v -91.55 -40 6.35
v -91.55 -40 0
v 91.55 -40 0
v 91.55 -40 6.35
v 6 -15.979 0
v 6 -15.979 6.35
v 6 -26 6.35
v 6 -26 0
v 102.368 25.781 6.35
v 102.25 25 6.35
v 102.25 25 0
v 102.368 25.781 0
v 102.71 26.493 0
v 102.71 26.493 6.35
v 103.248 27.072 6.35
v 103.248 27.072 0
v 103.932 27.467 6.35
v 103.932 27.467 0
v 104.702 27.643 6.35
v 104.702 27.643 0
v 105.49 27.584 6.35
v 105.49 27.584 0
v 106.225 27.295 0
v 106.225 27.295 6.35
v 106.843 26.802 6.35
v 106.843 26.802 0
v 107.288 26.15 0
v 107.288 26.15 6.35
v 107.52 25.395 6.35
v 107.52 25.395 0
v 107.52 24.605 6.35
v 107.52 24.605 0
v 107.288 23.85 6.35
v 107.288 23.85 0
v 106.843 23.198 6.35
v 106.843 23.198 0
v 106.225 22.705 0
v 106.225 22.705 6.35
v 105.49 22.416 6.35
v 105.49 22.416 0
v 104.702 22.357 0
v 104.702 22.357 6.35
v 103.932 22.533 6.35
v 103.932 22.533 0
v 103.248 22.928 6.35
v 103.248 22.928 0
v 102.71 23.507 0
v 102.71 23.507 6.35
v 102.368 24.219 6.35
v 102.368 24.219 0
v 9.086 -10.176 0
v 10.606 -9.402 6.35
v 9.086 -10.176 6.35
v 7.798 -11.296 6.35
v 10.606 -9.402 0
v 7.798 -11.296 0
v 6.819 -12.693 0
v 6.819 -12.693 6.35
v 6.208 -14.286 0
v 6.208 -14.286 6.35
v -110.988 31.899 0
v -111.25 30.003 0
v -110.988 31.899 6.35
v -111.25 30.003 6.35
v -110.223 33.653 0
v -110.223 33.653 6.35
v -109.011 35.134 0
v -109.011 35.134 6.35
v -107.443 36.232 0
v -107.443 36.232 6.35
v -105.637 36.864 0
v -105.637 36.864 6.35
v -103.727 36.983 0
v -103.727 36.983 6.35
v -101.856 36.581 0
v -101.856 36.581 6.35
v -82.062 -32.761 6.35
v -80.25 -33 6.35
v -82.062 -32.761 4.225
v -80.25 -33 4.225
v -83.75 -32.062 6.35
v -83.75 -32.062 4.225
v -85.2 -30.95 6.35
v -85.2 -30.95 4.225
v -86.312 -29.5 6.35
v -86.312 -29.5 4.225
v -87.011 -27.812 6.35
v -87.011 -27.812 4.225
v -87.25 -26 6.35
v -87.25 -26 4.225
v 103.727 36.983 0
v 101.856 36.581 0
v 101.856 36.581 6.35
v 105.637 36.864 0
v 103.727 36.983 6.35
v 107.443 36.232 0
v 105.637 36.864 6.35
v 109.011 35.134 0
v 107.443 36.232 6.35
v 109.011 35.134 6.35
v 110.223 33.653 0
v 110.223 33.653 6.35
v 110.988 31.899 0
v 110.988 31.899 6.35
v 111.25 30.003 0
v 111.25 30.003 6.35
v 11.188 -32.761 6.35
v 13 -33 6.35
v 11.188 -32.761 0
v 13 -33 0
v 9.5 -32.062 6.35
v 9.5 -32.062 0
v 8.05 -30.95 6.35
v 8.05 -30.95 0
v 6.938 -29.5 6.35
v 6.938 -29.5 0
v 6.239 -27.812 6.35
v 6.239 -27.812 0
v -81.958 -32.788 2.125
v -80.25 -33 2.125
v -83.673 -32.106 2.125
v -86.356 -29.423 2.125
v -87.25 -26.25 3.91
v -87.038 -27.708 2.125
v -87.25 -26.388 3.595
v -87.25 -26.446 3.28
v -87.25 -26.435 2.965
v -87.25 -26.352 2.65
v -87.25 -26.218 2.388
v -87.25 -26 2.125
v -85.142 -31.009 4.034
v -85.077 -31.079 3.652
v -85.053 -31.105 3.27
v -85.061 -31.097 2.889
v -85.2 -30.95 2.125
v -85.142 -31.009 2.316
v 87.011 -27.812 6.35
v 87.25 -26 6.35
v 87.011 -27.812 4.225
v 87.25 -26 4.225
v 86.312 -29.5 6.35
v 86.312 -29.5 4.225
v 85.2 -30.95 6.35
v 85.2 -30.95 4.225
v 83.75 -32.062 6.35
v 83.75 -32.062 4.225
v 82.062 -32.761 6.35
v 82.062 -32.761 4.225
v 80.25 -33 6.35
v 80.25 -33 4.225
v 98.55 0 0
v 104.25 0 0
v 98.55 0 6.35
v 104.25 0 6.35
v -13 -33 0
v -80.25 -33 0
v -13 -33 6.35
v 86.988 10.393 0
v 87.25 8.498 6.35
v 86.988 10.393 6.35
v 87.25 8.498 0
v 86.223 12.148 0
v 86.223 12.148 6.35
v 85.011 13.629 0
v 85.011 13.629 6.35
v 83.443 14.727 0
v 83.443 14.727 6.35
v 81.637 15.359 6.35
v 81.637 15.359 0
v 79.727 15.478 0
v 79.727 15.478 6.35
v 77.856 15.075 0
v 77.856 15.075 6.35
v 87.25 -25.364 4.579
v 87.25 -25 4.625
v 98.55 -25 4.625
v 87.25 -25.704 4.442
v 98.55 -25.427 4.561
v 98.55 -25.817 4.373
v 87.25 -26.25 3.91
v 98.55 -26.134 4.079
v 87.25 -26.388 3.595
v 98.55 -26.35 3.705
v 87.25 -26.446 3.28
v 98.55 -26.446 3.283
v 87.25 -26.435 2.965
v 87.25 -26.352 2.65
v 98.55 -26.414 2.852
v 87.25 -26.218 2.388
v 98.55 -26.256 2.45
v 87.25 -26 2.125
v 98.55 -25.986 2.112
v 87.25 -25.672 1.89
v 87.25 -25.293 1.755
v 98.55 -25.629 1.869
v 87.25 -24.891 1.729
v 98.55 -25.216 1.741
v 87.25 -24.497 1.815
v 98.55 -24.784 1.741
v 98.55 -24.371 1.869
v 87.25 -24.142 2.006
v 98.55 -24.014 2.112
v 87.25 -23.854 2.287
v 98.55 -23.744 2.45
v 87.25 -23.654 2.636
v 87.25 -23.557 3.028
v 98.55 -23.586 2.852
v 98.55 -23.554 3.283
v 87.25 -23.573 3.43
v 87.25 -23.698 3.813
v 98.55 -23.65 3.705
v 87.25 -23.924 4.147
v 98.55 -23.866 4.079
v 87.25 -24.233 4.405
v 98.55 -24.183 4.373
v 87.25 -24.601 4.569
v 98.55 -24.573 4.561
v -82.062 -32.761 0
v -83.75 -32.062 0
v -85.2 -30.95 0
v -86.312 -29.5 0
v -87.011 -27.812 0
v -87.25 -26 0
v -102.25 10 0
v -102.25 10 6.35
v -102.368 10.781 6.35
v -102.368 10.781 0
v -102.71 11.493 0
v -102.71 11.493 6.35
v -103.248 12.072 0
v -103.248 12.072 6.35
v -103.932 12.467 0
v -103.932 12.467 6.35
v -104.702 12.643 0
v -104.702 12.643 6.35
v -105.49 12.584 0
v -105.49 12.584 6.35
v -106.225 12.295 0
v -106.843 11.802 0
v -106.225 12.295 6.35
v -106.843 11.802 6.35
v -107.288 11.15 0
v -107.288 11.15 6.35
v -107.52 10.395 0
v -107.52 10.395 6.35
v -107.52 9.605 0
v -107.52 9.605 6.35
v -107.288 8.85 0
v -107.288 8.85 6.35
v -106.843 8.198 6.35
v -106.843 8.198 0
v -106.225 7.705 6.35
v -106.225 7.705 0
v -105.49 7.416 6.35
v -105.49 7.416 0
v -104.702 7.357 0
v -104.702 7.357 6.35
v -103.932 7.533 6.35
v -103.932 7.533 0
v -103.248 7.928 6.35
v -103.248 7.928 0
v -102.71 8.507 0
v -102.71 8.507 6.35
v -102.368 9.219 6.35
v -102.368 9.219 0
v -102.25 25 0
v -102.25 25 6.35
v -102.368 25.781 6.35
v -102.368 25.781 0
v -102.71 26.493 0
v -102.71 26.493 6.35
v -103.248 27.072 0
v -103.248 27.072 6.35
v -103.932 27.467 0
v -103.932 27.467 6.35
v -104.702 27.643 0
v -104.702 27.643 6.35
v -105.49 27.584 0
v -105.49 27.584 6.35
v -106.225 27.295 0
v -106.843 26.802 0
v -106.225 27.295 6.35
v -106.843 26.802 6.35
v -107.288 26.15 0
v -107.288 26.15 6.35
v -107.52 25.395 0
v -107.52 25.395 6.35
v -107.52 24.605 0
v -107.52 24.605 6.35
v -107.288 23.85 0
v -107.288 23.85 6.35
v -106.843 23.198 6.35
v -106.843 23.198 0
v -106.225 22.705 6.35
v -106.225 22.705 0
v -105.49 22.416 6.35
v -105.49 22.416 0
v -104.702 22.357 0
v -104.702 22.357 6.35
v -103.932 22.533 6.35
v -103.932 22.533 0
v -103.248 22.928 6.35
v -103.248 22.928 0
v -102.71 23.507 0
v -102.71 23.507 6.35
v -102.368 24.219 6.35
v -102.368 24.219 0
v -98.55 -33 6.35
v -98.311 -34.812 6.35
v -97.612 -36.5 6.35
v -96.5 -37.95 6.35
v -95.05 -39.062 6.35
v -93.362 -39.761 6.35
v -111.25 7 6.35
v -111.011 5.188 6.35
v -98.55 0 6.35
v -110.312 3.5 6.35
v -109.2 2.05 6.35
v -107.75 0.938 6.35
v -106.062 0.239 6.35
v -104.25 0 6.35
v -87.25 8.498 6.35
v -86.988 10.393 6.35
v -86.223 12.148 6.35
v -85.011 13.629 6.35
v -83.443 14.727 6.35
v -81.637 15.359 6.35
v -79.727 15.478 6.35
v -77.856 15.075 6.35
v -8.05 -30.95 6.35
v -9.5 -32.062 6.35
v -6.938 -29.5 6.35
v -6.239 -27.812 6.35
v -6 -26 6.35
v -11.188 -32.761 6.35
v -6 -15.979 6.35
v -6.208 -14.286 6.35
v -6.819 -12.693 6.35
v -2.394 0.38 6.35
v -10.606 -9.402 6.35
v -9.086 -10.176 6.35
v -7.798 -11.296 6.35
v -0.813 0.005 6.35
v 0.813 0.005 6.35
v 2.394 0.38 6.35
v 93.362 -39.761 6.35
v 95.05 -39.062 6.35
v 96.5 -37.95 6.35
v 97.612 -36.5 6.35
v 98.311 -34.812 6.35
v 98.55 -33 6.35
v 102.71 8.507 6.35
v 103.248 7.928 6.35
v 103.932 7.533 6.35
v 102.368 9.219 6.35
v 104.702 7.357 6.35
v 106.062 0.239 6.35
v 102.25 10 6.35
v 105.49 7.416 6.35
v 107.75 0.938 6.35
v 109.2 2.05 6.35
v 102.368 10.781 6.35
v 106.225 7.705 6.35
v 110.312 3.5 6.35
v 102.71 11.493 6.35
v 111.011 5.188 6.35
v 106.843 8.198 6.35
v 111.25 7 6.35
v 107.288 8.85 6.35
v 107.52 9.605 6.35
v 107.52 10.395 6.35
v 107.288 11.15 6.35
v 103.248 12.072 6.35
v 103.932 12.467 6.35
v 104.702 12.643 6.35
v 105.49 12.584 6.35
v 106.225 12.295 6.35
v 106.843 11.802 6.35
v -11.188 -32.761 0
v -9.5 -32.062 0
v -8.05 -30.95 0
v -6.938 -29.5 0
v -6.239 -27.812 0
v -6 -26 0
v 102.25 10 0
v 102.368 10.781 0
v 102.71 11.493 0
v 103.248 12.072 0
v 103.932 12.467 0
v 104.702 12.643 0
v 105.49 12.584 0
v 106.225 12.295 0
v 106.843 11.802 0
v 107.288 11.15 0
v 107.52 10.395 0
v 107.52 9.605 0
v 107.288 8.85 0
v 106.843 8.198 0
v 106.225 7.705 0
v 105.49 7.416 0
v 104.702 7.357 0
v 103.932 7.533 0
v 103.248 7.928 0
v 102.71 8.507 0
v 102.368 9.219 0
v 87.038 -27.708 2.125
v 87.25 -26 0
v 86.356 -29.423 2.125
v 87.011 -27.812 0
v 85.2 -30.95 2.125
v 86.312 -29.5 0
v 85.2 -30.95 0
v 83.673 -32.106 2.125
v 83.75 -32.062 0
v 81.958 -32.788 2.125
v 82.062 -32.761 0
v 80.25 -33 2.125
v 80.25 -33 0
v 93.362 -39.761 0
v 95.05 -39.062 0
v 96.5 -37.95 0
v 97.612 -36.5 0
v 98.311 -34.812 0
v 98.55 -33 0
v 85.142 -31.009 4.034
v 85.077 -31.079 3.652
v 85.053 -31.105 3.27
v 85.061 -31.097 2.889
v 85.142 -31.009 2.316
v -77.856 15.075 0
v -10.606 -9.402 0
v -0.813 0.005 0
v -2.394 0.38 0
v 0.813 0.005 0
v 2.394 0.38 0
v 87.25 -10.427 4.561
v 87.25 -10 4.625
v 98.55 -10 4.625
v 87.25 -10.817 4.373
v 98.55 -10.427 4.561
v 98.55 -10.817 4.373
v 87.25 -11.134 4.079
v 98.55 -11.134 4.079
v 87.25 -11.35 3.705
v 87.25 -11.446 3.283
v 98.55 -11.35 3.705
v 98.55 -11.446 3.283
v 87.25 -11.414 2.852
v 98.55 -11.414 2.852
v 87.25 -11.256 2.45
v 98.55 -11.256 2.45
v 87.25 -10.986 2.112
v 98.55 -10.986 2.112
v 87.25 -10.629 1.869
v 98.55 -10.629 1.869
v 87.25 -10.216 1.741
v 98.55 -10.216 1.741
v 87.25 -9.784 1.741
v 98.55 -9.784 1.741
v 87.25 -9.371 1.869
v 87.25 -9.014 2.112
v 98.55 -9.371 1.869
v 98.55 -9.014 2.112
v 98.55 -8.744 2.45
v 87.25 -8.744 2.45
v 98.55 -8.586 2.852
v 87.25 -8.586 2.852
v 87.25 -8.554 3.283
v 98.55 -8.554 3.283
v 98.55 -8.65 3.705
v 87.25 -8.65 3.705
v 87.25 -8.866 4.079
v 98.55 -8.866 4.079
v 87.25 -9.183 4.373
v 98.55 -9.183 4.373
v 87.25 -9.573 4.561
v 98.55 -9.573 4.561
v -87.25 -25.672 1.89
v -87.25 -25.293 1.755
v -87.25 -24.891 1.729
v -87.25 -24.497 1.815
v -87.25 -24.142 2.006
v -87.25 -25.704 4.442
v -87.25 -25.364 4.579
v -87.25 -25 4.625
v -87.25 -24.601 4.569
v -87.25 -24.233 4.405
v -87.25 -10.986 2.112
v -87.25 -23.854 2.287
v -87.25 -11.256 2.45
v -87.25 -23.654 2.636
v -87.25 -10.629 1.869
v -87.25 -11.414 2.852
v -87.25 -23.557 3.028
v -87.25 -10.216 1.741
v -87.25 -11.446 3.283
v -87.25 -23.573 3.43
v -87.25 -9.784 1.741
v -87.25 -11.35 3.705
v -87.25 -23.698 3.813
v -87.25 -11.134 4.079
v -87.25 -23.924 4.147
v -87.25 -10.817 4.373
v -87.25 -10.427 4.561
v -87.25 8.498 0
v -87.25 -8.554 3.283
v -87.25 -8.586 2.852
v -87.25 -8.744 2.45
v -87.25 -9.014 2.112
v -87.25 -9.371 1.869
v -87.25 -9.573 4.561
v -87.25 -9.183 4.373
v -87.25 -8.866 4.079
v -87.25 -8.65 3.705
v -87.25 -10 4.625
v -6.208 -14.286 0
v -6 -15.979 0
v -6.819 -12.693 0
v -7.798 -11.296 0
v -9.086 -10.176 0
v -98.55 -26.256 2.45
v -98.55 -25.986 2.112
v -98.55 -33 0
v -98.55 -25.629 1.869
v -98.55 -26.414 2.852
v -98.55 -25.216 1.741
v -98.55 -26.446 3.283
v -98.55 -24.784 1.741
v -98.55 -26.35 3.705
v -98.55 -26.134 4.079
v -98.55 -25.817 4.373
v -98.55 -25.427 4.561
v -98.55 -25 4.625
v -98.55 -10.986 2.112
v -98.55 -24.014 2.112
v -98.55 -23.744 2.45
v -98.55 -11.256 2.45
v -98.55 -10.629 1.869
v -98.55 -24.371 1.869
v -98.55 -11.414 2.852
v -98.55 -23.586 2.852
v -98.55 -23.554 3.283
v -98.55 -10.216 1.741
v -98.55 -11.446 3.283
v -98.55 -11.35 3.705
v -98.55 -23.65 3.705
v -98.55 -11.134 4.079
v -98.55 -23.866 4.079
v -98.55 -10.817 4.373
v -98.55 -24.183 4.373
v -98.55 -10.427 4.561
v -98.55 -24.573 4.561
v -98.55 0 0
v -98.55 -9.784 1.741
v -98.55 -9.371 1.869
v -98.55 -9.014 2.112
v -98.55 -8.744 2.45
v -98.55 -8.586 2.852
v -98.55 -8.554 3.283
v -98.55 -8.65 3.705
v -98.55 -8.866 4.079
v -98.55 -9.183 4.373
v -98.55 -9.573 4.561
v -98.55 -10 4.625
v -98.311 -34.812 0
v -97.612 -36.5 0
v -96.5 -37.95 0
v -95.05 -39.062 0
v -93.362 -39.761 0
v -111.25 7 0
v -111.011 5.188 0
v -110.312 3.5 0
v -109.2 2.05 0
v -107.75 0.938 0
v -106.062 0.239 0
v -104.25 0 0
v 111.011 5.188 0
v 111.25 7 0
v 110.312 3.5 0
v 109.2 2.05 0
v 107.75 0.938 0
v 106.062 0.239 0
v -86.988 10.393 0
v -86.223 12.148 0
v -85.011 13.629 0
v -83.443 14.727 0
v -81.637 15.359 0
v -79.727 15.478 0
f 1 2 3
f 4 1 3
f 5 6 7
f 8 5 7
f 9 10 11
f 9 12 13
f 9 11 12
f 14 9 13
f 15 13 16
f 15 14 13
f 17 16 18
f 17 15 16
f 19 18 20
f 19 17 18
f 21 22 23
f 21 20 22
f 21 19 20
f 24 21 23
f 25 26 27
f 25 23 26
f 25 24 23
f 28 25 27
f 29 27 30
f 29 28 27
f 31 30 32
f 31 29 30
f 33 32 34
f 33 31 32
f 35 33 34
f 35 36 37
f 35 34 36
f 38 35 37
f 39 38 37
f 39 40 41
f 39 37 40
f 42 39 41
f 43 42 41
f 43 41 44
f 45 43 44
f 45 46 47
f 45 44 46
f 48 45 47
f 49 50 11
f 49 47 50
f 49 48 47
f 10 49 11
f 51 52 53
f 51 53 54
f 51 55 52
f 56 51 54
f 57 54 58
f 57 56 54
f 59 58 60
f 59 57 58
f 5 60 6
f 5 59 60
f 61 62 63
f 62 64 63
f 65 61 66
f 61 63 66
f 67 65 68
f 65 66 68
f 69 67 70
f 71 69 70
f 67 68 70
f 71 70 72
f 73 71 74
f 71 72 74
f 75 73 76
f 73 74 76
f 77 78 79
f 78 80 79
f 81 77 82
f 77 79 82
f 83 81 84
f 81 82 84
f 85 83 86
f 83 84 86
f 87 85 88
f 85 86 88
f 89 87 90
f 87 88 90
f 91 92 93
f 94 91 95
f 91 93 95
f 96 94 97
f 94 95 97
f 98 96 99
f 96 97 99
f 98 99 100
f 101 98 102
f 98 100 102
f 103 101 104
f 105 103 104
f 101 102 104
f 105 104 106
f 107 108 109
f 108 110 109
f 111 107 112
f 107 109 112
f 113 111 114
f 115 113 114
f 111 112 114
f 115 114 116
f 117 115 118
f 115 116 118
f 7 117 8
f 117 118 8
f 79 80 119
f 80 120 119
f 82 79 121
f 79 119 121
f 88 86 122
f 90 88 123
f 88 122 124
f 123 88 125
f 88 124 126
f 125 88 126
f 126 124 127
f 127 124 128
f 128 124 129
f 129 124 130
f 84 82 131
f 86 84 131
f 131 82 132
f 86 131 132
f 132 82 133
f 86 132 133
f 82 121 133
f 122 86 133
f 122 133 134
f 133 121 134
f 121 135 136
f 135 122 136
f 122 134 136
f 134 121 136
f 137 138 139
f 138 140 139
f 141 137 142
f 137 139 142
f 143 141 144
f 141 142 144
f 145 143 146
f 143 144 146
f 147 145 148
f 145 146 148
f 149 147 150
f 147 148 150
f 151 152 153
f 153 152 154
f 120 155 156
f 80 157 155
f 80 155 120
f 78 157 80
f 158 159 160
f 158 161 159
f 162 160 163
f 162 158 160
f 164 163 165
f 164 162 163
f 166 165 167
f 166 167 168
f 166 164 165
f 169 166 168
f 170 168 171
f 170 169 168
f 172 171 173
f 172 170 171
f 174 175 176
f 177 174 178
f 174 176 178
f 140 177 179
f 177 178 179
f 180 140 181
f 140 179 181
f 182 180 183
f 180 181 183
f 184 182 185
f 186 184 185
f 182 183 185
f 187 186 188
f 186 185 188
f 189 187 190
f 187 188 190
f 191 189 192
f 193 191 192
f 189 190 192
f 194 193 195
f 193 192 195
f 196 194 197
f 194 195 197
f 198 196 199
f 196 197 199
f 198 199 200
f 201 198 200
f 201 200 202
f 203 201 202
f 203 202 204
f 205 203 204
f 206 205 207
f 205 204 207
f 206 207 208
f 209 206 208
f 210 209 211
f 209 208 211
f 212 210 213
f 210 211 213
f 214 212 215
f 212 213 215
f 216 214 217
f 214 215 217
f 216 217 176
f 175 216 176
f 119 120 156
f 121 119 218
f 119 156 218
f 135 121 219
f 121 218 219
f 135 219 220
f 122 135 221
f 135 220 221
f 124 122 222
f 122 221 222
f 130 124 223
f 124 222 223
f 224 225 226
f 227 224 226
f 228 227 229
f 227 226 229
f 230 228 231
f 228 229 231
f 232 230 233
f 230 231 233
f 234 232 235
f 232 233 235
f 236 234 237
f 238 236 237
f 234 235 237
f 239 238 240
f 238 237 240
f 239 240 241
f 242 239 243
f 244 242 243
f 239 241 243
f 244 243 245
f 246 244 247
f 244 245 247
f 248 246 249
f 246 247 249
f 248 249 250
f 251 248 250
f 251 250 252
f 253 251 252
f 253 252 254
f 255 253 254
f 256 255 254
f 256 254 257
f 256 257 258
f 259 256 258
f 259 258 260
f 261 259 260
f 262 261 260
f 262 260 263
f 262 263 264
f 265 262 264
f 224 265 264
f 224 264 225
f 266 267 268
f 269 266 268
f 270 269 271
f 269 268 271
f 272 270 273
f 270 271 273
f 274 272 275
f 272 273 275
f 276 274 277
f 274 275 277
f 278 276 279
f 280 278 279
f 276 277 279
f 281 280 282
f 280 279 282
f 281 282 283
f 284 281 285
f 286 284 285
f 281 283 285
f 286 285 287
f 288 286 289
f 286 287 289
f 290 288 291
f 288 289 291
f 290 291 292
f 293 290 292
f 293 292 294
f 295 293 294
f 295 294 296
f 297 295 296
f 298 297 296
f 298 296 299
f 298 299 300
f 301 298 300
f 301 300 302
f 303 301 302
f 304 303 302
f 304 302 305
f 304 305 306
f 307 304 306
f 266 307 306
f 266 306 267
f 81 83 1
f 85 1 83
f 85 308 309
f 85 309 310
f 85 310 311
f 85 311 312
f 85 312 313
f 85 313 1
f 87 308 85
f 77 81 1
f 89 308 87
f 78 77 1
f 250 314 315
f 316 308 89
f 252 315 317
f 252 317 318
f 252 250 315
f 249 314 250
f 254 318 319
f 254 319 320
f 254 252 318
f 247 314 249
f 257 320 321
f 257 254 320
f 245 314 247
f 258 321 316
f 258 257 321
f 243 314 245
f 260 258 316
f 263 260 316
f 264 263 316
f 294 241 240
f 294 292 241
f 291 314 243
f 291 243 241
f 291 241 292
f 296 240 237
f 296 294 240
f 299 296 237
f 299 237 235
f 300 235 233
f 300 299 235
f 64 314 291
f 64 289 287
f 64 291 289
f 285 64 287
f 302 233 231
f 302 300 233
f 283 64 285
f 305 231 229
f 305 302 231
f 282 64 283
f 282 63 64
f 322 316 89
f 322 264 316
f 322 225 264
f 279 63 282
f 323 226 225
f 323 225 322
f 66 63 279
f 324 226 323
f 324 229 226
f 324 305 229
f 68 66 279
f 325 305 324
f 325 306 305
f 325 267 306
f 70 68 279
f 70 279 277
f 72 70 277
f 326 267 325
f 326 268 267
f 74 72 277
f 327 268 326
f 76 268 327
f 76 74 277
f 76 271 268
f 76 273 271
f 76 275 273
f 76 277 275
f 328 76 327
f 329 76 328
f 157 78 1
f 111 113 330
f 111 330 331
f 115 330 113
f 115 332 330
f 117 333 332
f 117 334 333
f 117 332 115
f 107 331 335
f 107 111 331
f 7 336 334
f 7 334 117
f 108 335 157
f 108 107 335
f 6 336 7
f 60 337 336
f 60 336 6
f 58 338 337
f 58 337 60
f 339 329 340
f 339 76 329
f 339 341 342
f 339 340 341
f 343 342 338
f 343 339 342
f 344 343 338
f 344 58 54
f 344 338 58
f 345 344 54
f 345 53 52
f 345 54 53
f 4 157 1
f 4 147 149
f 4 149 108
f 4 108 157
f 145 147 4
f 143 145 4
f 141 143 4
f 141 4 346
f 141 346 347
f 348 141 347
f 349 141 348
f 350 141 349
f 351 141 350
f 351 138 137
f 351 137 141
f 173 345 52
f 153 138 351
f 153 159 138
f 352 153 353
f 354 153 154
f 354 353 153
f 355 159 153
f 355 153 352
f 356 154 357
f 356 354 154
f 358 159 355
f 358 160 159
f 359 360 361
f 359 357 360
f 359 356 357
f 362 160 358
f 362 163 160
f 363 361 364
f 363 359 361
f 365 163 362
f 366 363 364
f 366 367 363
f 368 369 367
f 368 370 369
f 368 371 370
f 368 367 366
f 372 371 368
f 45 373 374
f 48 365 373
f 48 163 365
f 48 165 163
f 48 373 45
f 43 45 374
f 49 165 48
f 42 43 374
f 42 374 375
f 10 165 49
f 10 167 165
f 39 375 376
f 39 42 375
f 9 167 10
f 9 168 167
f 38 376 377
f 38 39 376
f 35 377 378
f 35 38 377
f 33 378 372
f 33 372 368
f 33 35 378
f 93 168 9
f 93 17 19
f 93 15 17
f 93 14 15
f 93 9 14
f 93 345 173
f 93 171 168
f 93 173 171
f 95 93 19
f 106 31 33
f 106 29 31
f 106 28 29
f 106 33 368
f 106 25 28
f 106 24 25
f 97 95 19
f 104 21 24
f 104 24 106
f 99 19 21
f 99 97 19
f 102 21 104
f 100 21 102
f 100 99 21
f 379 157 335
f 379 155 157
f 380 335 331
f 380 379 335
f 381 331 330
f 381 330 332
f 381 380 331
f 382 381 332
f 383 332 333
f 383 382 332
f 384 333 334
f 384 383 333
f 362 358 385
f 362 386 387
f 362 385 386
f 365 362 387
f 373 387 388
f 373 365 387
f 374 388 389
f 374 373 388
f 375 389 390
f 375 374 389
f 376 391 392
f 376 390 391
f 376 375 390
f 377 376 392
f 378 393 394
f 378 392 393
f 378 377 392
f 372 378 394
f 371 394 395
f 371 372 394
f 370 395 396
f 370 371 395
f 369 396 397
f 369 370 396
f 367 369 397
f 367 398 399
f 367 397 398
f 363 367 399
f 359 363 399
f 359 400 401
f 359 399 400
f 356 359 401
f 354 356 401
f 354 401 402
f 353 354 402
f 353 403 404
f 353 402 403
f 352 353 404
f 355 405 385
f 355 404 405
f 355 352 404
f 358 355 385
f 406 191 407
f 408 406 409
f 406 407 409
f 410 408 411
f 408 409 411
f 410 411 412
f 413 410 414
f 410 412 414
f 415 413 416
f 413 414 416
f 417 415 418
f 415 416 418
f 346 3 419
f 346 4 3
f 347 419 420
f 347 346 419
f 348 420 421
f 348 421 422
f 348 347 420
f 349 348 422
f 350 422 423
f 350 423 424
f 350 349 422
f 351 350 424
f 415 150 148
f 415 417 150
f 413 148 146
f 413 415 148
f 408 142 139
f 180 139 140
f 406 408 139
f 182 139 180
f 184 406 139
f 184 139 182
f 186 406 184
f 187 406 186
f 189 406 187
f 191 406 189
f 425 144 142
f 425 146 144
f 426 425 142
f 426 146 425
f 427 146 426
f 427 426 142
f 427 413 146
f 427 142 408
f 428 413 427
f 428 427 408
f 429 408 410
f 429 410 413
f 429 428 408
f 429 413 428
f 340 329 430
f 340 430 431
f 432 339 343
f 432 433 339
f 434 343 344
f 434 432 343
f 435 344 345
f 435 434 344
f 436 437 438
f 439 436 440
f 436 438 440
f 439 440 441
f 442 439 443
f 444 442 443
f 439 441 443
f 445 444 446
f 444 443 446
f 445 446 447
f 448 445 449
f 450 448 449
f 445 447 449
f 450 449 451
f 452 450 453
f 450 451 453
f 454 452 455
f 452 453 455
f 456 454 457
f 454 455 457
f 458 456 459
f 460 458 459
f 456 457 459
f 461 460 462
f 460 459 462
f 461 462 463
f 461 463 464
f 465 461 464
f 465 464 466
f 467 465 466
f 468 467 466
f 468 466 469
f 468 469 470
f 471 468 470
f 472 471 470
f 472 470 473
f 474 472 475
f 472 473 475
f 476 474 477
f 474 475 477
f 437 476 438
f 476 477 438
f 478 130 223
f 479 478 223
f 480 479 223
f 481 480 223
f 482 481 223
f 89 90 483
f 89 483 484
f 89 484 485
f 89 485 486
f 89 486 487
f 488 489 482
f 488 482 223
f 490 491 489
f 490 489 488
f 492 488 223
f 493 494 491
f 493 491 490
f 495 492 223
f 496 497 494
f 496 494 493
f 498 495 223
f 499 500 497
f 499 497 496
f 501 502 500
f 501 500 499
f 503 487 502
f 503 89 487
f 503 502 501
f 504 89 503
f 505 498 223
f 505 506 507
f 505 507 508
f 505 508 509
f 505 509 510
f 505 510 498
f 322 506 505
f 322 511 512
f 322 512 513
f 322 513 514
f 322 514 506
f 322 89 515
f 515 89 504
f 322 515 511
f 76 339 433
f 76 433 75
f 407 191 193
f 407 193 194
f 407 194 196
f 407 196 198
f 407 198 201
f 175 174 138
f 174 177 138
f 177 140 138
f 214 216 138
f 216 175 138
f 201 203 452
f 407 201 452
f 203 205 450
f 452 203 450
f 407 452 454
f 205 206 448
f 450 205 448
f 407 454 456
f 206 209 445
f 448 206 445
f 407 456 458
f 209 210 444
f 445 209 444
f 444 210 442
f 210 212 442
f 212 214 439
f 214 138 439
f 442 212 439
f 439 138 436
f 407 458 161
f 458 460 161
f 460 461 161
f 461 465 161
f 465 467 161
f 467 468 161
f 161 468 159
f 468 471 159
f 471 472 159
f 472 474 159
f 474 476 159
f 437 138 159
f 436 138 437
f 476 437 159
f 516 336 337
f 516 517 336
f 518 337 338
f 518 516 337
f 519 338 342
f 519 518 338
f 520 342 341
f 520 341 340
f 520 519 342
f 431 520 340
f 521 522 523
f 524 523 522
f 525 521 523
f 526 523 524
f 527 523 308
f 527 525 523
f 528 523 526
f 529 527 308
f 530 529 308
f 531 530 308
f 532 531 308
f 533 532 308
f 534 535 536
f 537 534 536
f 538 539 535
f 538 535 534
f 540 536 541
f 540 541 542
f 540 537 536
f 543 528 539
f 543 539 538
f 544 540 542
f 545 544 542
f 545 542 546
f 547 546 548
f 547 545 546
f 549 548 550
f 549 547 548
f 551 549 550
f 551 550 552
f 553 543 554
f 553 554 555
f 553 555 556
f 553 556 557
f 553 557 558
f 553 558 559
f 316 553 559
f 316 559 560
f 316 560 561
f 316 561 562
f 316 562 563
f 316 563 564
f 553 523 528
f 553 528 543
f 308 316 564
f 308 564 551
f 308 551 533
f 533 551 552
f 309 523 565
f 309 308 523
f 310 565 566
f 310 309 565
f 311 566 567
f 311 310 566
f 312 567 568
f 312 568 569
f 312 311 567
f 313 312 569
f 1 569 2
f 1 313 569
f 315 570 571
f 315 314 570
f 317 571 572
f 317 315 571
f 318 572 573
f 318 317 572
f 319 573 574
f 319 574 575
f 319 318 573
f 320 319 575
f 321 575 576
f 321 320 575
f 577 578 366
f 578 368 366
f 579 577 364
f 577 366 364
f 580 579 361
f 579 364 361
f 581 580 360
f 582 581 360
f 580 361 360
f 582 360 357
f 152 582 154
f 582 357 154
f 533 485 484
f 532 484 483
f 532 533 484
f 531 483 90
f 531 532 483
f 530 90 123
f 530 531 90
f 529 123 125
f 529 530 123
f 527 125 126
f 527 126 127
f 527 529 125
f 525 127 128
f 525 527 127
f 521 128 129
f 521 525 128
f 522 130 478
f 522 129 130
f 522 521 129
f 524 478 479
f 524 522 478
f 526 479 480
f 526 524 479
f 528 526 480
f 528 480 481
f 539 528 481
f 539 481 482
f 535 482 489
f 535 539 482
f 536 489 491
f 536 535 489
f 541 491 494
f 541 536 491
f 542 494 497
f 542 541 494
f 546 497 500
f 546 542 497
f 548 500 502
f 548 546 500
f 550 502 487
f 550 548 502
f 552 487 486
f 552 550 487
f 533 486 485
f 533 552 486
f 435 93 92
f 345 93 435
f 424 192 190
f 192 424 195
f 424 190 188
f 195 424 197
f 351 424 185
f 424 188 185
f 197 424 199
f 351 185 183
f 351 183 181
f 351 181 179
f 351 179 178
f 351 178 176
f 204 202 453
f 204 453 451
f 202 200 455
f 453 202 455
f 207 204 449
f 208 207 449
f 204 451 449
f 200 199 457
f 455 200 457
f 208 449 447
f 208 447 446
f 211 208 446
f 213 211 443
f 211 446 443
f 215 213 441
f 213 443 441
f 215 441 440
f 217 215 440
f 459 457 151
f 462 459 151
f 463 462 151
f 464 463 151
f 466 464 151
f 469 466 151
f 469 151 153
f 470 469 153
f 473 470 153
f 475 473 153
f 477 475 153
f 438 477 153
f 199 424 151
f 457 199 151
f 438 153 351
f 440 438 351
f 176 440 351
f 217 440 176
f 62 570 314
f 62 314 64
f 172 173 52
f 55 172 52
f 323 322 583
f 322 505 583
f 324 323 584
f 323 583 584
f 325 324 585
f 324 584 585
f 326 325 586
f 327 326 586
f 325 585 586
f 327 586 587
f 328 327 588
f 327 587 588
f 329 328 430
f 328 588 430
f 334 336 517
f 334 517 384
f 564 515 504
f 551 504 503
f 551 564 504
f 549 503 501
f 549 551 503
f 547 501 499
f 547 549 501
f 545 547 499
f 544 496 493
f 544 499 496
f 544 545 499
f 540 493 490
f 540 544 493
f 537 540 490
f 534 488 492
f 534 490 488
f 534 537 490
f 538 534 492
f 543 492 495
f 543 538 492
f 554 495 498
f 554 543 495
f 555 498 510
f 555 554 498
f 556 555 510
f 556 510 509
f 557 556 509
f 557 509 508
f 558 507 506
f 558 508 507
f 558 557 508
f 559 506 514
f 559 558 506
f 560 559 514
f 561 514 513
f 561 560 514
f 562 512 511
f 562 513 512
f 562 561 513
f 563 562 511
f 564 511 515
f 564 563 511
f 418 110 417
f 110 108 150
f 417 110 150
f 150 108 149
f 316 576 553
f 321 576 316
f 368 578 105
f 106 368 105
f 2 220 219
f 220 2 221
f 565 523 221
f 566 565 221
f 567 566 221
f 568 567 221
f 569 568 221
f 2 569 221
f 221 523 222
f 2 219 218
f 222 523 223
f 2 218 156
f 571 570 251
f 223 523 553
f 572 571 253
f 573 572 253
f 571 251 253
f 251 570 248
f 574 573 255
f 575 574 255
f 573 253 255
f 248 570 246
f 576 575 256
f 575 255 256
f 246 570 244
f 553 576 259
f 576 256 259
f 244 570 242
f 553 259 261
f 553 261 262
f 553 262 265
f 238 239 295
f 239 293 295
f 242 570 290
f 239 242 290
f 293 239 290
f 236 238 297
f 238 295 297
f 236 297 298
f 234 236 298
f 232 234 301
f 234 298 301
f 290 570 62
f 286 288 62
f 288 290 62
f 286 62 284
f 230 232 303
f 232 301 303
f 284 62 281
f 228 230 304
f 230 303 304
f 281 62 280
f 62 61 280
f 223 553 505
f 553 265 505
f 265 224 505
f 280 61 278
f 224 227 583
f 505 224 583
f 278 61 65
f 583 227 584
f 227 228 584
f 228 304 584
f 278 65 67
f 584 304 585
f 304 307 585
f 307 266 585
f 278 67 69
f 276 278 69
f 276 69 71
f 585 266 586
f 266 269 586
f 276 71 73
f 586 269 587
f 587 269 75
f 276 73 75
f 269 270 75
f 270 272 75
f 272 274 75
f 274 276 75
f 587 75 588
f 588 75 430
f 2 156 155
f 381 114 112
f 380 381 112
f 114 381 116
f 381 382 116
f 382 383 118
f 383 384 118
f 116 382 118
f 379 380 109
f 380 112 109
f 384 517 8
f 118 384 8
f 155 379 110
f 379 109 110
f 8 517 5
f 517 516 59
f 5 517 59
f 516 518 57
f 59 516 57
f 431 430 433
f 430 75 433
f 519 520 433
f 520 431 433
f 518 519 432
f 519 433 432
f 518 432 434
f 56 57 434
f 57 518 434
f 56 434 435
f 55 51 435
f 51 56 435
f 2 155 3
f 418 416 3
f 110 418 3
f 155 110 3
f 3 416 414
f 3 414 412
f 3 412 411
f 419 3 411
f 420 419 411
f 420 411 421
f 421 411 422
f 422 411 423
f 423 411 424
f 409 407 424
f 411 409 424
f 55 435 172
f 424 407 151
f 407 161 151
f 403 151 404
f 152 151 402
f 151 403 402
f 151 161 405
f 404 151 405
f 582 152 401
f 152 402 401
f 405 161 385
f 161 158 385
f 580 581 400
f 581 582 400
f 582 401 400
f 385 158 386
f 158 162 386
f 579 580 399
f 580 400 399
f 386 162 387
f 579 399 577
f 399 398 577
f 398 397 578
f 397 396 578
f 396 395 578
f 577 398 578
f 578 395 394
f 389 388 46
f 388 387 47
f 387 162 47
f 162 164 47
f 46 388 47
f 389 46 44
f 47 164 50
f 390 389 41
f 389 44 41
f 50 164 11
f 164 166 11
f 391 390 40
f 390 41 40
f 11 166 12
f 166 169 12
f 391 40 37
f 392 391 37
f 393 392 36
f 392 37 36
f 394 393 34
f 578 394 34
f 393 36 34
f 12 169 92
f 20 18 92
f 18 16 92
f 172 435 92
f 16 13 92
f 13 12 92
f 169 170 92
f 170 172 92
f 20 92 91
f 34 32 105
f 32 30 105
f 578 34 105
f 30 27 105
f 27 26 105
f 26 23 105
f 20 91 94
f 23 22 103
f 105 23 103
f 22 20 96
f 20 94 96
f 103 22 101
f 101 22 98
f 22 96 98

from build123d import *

# Parameters (mm, degrees)
SKETCH1_W                        = 222.5
SKETCH1_H                        = 80
BOSS_EXTRUDE1_DEPTH              = 6.35
SKETCH6_W                        = 6.35
SKETCH6_H                        = 40
CUT_EXTRUDE3_DEPTH               = 12.7
M3_5X0_6_TAPPED_HOLE1_AT_2_COUNT = 2
M3_5X0_6_TAPPED_HOLE1_AT_2_PITCH = 15
CUT_EXTRUDE1_DEPTH               = 119.392926309
CUT_EXTRUDE2_DEPTH               = 119.392926309
M5_CLEARANCE_HOLE1_D             = 5.3
FILLET1_R                        = 7


with BuildPart() as part:
    # Sketch1 → Boss-Extrude1 (new body)
    with BuildSketch(Plane.XY):
        Rectangle(SKETCH1_W, SKETCH1_H)
    extrude(amount=BOSS_EXTRUDE1_DEPTH)

    # Sketch6 → Cut-Extrude3 (cut)
    with BuildSketch(Plane.ZY.offset(111.25)):
        with Locations((3.175, -20)):
            Rectangle(SKETCH6_W, SKETCH6_H)
    cut_extrude3 = extrude(amount=-CUT_EXTRUDE3_DEPTH, mode=Mode.SUBTRACT)

    # Sketch7 → M3.5x0.6 Tapped Hole1 (revolve, cut)
    with BuildSketch(Plane(origin=(-98.55, -25, 3.175), x_dir=(0, 0, 1), z_dir=(0, 1, 0))):
        Polygon((0, 0), (0, 14.671247898), (1.45, 13.8), (1.45, 0), align=None)
    m3_5x0_6_tapped_hole1 = revolve(axis=Axis((-104.9, -25, 3.175), (1, 0, 0)), mode=Mode.SUBTRACT)

    # M3.5x0.6 Tapped Hole1 at 2: M3.5x0.6 Tapped Hole1 ×2
    with Locations(*[(0, i * M3_5X0_6_TAPPED_HOLE1_AT_2_PITCH, 0) for i in range(1, M3_5X0_6_TAPPED_HOLE1_AT_2_COUNT)]):
        add(m3_5x0_6_tapped_hole1, mode=Mode.SUBTRACT)

    # Sketch2 → Cut-Extrude1 (cut, through all)
    with BuildSketch(Plane.XY.offset(6.35)):
        Polygon((111.25, 40), (0, -0.491688562), (-111.25, 40), align=None)
    extrude(amount=-CUT_EXTRUDE1_DEPTH, mode=Mode.SUBTRACT)

    # Sketch3 → Cut-Extrude2 (cut, through all)
    with BuildSketch(Plane.XY.offset(6.35)):
        Polygon((-87.25, -33), (-87.25, 18.494581108), (-6, -11.078000426), (-6, -33), align=None)
    cut_extrude2 = extrude(amount=-CUT_EXTRUDE2_DEPTH, mode=Mode.SUBTRACT)

    # M5 Clearance Hole1 (through all)
    with Locations(Plane(origin=(0, 0, 0), x_dir=(-1, 0, 0), z_dir=(0, 0, -1))):
        with Locations((104.9, 10), (104.9, 25)):
            m5_clearance_hole1 = Hole(M5_CLEARANCE_HOLE1_D / 2)

    # Mirror1: Cut-Extrude3, M3.5x0.6 Tapped Hole1, Cut-Extrude2, M5 Clearance Hole1 across plane
    add(cut_extrude3.mirror(Plane(origin=(0, 0, 0), x_dir=(0, 0, 1), z_dir=(1, 0, 0))), mode=Mode.SUBTRACT)
    add(m3_5x0_6_tapped_hole1.mirror(Plane(origin=(0, 0, 0), x_dir=(0, 0, 1), z_dir=(1, 0, 0))), mode=Mode.SUBTRACT)
    add(cut_extrude2.mirror(Plane(origin=(0, 0, 0), x_dir=(0, 0, 1), z_dir=(1, 0, 0))), mode=Mode.SUBTRACT)
    add(m5_clearance_hole1.mirror(Plane(origin=(0, 0, 0), x_dir=(0, 0, 1), z_dir=(1, 0, 0))), mode=Mode.SUBTRACT)

    # Mirror1 copy 1 sketch → Mirror1 copy 1 (revolve, cut)
    with BuildSketch(Plane(origin=(98.55, -10, 3.175), x_dir=(0, 0, 1), z_dir=(0, 1, 0))):
        Polygon((0, 0), (0, -14.671247898), (1.45, -13.8), (1.45, 0), align=None)
    revolve(axis=Axis((104.9, -10, 3.175), (1, 0, 0)), mode=Mode.SUBTRACT)

    # Fillet1
    fillet1_edges = [part.edges().sort_by_distance(p)[0] for p in [
        (87.25, 18.494581108, 3.175),
        (87.25, -33, 3.175),
        (6, -33, 3.175),
        (6, -11.078000426, 3.175),
        (-98.55, -40, 3.175),
        (-111.25, 0, 3.175),
        (0, -0.491688562, 3.175),
        (-87.25, -33, 3.175),
        (-6, -33, 3.175),
        (-87.25, 18.494581108, 3.175),
        (-6, -11.078000426, 3.175),
        (-111.25, 40, 3.175),
        (111.25, 40, 3.175),
        (111.25, 0, 3.175),
        (98.55, -40, 3.175),
    ]]
    fillet(fillet1_edges, radius=FILLET1_R)


solid = part.part
